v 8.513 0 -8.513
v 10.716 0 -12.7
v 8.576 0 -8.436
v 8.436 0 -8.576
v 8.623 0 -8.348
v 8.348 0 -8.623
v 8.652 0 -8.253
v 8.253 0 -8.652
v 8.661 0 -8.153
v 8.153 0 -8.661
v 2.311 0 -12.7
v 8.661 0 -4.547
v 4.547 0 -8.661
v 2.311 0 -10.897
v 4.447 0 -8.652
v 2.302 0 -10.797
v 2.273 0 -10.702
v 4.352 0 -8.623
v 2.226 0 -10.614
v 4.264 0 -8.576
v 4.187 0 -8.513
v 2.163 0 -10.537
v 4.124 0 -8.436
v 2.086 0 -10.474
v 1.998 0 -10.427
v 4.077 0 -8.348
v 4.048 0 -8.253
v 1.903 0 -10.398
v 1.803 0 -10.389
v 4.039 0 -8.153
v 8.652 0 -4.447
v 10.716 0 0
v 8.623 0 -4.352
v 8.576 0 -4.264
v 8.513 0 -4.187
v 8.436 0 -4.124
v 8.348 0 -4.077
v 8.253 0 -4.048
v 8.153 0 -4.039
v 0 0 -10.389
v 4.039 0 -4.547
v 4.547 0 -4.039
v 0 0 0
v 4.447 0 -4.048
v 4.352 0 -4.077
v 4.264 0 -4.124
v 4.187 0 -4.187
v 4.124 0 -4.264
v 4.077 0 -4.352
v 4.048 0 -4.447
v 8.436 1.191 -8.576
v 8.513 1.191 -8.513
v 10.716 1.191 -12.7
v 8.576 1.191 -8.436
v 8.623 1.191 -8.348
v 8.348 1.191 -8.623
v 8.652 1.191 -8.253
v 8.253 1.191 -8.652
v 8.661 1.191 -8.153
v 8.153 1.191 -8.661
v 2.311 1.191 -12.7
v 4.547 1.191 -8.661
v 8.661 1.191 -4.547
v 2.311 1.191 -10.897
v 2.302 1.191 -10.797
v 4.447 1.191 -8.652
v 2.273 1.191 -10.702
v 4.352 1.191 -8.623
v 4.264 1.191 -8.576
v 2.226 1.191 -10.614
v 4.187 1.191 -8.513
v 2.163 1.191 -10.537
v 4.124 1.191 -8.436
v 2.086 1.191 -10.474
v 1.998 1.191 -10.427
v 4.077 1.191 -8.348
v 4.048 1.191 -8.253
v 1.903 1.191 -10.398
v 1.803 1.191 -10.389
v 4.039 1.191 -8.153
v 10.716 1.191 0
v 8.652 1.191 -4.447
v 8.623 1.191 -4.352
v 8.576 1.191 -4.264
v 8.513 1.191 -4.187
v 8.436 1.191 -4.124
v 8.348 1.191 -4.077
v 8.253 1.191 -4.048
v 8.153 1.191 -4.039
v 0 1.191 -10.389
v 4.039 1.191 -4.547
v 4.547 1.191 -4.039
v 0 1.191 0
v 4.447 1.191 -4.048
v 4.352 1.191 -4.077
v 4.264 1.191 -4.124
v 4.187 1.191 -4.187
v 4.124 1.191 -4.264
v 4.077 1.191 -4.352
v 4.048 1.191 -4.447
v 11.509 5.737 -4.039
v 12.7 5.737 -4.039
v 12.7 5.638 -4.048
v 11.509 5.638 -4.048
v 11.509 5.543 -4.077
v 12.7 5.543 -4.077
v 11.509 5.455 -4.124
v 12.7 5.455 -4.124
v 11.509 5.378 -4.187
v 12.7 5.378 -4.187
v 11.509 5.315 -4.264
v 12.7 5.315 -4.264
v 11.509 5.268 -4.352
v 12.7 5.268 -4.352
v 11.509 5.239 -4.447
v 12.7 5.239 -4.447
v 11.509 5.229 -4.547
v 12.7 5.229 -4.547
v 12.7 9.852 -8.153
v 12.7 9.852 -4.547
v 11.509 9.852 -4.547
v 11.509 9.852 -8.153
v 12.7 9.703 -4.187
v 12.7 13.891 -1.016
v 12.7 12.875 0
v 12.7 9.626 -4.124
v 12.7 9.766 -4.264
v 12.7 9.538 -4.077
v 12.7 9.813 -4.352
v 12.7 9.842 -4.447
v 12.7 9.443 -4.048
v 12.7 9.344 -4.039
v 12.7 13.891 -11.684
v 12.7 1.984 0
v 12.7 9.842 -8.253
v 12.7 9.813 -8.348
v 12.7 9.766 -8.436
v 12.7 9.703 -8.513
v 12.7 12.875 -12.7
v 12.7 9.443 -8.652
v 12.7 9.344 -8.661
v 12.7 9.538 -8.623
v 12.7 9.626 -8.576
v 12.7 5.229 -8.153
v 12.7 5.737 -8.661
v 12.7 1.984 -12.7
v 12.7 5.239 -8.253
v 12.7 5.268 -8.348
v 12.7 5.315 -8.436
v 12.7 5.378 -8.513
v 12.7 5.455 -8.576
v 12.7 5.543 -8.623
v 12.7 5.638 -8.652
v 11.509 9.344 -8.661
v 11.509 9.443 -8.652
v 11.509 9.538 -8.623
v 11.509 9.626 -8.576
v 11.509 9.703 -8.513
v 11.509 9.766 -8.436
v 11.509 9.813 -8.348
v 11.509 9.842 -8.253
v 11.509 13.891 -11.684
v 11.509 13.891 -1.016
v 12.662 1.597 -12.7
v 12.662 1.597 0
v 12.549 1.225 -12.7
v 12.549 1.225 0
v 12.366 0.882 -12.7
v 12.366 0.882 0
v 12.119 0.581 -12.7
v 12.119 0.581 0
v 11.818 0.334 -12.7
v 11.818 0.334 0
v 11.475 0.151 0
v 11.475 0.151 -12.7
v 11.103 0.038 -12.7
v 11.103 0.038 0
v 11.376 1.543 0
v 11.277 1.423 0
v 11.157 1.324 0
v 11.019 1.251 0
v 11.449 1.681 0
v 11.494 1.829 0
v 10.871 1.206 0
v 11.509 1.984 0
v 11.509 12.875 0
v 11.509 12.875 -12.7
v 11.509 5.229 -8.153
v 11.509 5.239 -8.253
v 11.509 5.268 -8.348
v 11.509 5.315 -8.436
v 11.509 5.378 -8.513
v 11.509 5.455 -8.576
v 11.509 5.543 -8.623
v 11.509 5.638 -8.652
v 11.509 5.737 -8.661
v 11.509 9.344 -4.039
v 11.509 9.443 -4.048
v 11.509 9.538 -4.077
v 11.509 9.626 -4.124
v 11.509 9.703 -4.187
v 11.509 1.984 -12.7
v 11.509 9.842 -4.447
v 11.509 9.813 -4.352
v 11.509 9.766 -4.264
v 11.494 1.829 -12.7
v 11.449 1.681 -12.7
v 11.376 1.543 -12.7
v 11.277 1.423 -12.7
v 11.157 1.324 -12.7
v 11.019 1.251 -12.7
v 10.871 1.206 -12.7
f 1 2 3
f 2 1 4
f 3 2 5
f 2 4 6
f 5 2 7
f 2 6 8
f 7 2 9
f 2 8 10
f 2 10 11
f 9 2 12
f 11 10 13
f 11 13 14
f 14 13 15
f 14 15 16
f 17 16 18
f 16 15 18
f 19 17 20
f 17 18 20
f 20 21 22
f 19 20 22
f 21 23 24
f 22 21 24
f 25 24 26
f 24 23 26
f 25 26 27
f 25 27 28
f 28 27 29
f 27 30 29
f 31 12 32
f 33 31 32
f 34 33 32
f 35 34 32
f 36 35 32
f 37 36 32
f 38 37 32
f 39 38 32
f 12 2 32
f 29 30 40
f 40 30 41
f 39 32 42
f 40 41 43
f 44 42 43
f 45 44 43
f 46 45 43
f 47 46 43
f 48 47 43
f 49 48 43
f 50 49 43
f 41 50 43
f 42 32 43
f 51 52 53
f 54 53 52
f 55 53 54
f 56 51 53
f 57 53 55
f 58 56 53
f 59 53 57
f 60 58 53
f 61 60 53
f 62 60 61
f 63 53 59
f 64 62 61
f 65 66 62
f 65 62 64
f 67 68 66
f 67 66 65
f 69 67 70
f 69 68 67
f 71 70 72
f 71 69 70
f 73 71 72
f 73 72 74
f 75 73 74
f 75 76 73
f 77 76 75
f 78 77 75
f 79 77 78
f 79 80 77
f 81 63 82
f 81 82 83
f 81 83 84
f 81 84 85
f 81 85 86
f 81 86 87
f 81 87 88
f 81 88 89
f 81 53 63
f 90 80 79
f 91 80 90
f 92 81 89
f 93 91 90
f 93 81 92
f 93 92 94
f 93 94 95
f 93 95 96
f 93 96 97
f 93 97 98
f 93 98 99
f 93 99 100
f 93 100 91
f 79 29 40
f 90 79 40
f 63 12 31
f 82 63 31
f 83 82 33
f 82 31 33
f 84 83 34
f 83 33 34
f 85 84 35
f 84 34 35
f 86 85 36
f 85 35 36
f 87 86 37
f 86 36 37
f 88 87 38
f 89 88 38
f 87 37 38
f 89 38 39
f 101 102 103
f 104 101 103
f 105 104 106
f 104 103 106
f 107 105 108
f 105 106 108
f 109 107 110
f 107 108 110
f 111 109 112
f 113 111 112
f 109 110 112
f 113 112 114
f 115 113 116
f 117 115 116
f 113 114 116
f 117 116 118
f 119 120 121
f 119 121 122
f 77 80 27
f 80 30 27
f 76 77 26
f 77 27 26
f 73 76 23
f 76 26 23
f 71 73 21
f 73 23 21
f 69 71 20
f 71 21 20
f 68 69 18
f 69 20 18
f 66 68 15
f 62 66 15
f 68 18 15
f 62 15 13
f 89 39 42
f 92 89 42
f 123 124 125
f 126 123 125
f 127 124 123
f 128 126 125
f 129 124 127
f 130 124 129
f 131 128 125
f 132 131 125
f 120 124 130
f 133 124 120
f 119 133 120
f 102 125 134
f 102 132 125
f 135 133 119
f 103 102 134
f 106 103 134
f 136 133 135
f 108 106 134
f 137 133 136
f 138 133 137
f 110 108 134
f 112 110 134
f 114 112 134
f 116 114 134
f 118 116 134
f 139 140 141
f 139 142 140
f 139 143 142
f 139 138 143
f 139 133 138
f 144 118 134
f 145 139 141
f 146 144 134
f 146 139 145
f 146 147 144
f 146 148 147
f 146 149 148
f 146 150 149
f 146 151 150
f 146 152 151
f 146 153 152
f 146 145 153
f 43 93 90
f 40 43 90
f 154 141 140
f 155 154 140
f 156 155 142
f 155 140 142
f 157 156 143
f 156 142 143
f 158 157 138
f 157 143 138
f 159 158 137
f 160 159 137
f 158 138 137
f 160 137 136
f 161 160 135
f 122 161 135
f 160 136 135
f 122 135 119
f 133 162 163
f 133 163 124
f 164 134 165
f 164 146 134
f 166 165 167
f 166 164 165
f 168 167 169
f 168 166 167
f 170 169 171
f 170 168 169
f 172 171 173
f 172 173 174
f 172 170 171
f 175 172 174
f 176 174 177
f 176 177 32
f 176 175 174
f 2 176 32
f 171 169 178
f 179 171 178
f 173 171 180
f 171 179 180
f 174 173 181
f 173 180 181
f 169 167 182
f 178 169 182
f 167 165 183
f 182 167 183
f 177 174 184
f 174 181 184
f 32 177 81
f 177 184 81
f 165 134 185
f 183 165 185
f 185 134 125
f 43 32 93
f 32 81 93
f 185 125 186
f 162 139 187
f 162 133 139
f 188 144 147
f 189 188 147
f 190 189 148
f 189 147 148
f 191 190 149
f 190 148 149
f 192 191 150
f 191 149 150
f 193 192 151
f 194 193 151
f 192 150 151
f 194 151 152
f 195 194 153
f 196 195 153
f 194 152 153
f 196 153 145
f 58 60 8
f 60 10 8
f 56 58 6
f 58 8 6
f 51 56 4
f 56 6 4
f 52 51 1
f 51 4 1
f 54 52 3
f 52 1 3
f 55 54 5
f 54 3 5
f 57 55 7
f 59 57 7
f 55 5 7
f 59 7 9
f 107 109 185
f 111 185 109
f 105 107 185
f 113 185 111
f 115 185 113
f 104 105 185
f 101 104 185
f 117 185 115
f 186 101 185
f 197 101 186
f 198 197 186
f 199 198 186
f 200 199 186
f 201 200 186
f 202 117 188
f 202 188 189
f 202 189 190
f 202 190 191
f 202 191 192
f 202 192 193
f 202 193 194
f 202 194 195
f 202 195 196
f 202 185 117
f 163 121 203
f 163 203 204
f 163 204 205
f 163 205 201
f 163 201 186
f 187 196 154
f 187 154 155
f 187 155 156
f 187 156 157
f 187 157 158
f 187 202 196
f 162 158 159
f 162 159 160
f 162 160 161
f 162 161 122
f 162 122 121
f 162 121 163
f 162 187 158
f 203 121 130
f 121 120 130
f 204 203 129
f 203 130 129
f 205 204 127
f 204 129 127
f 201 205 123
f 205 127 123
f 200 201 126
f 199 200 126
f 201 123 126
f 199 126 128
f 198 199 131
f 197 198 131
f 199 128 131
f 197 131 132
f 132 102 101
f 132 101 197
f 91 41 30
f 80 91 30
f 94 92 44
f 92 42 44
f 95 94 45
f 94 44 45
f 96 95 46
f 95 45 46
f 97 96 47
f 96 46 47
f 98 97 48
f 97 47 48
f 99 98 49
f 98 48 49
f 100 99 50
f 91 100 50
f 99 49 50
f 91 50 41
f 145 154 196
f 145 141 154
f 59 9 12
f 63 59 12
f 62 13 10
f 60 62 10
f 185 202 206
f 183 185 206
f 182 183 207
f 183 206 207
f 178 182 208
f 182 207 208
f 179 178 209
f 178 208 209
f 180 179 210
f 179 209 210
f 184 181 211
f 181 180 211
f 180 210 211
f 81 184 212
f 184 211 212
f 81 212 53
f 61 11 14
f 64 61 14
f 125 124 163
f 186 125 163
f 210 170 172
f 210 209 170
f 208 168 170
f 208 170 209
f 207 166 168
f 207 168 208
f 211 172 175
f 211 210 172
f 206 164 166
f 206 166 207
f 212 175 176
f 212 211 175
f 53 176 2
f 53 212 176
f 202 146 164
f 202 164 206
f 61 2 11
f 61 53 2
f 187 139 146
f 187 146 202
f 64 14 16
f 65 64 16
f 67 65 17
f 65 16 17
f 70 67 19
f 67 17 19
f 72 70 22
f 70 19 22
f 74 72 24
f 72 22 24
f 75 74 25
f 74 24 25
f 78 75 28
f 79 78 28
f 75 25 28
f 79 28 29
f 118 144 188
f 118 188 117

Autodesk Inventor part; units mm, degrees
ref_plane "YZ Plane" through (0, 0, 0) normal (1, 0, 0) x (0, 1, 0)
ref_plane "XZ Plane" through (0, 0, 0) normal (0, 1, 0) x (-1, 0, 0)
sketch "Sketch1" plane through (0, 0, 0) normal (0, 1, 0) x (-1, 0, 0)
  line L0 (-12.7, 0) -> (12.7, 0)
  line L1 (12.7, 0) -> (12.7, -12.7)
  line L2 (12.7, -12.7) -> (-12.7, -12.7)
  line L3 (-12.7, -12.7) -> (-12.7, 0)
  line L4 (12.7, 0) -> (-12.7, -12.7) construction
  point P0 (0, 0)
  point P1 (0, 0)
  dimension "d0" = 25.4
  dimension "d1" = 12.7
extrude "Plate1" add sketch "Sketch1" along normal blind 1.1906
sketch "Sketch2" plane through (11.5094, 0, -12.7) normal (1, 0, 0) x (0, 1, 0)
  line L0 (0, 12.7) -> (0, 0)
  line L1 (0, 0) -> (13.8906, 0)
  line L2 (13.8906, 0) -> (13.8906, 12.7)
  line L3 (13.8906, 12.7) -> (0, 12.7)
edge flange "Flanges" height 12.7 angle 90 thickness 1.1906 bend radius 0.7937 thickness toward (1, 0, 0) relief tear relief width 1.1906 relief depth 0.5953 corner gap 1.1906 corner form 0 edges at (12.7, 1.1906, -6.35) (-12.7, 1.1906, -6.35) wall of the first edge with corners at (11.5094, 0, 0) (11.5094, 0, -12.7) (11.5094, 13.8906, -12.7) (11.5094, 13.8906, 0)
bend "Bend1"
corner "Corner1"
sketch "Sketch3" plane through (12.7, 1.9844, -12.7) normal (1, 0, 0) x (0, 0, -1)
  line L0 (-8.1534, 7.8676) -> (-4.5466, 7.8676)
  line L1 (-4.0386, 7.3596) -> (-4.0386, 3.7528)
  line L2 (-4.5466, 3.2448) -> (-8.1534, 3.2448)
  line L3 (-8.6614, 3.7528) -> (-8.6614, 7.3596)
  arc A0 (-8.1534, 7.8676) -> (-8.6614, 7.3596) centre (-8.1534, 7.3596) ccw
  arc A1 (-4.0386, 7.3596) -> (-4.5466, 7.8676) centre (-4.5466, 7.3596) ccw
  arc A2 (-4.5466, 3.2448) -> (-4.0386, 3.7528) centre (-4.5466, 3.7528) ccw
  arc A3 (-8.6614, 3.7528) -> (-8.1534, 3.2448) centre (-8.1534, 3.7528) ccw
  line L4 (-12.7, 0) -> (-12.7, 11.9063) construction
  line L5 (-12.7, 11.9063) -> (0, 11.9063) construction
  line L6 (-8.1534, 7.3596) -> (-4.5466, 3.7528) construction
  point P0 (-12.7, -1.9844)
  point P1 (-4.0386, 3.2448)
  point P2 (-8.6614, 3.2448)
  point P3 (-6.35, 5.5562)
  dimension "d16" = 4.6228
  dimension "d17" = 0.508
  dimension "d20" = 6.35
  dimension "d21" = 6.35
extrude "Flange Stamp" cut sketch "Sketch3" against normal blind 1.1906
sketch "Sketch7" plane through (12.7, 1.9844, 0) normal (1, 0, 0) x (0, 0, -1)
  arc A0 (4.5466, 7.8676) -> (4.0386, 7.3596) centre (4.5466, 7.3596) ccw construction
  arc A1 (8.1534, 3.2448) -> (8.6614, 3.7528) centre (8.1534, 3.7528) ccw construction
  circle A2 centre (6.35, 5.5563) radius 2.1844
  line L0 (4.5466, 7.3596) -> (8.1534, 3.7528) construction
  point P0 (0, -1.9844)
  dimension "d46" = 4.3688
surface extrude "Flange Circle" sketch "Sketch7" against normal up to surface (1.1906 mm away) shown yes curves A2
ref_plane "Flange Pattern Plane" through (12.7, 7.5406, -4.5466) normal (0, 1, 0) x (1, 0, 0)
sketch "Flange Pattern Sketch" plane through (12.7, 7.5406, -4.5466) normal (0, 1, 0) x (1, 0, 0)
  line L0 (0, 3.6068) -> (0, 0) construction
  line L1 (-30.5622, -4.5466) -> (5.5732, -4.5466) construction
  line L2 (0, 0) -> (-1.1906, 0) construction
  point P0 (-12.7, -4.5466)
  point P1 (0, 1.8034)
  point P2 (0, 14.5034)
  dimension "d43" = 25.4
  dimension "d40" = 12.7
feature "Flange Pattern" [suppressed]
sketch "Sketch8" plane through (0, 0, 0) normal (0, -1, 0) x (1, 0, 0)
  line L0 (10.7156, 0) -> (-10.7156, 0) construction
  line L1 (8.1534, -4.0386) -> (4.5466, -4.0386)
  line L2 (4.0386, -4.5466) -> (4.0386, -8.1534)
  line L3 (4.5466, -8.6614) -> (8.1534, -8.6614)
  line L4 (8.6614, -8.1534) -> (8.6614, -4.5466)
  arc A0 (8.6614, -4.5466) -> (8.1534, -4.0386) centre (8.1534, -4.5466) ccw
  arc A1 (8.1534, -8.6614) -> (8.6614, -8.1534) centre (8.1534, -8.1534) ccw
  arc A2 (4.0386, -8.1534) -> (4.5466, -8.6614) centre (4.5466, -8.1534) ccw
  arc A3 (4.5466, -4.0386) -> (4.0386, -4.5466) centre (4.5466, -4.5466) ccw
  line L5 (8.1534, -4.5466) -> (4.5466, -8.1534) construction
  line L6 (12.7, 0) -> (12.7, -12.7) construction
  point P0 (0, 0)
  point P1 (4.0386, -8.6614)
  point P2 (8.6614, -8.6614)
  point P3 (6.35, -6.35)
  dimension "d49" = 4.6228
  dimension "d50" = 0.508
  dimension "d51" = 6.35
  dimension "d52" = 6.35
extrude "Body Stamp" cut sketch "Sketch8" against normal blind 1.1906
sketch "Sketch9" plane through (0, 0, 0) normal (0, -1, 0) x (1, 0, 0)
  arc A0 (8.6614, -4.5466) -> (8.1534, -4.0386) centre (8.1534, -4.5466) ccw construction
  arc A1 (4.0386, -8.1534) -> (4.5466, -8.6614) centre (4.5466, -8.1534) ccw construction
  line L0 (8.1534, -4.5466) -> (4.5466, -8.1534) construction
  circle A2 centre (6.35, -6.35) radius 2.1844
  point P0 (0, 0)
  dimension "d55" = 4.3688
surface extrude "Body Circle" sketch "Sketch9" against normal up to surface (1.1906 mm away) shown yes curves A2
sketch "Body Pattern Sketch" plane through (0, 0, 0) normal (0, -1, 0) x (1, 0, 0)
  line L0 (10.7156, 0) -> (-10.7156, 0) construction
  line L1 (12.7, 0) -> (12.7, -12.7) construction
  point P0 (0, 0)
  point P1 (6.35, -6.35)
  point P2 (6.35, -19.05)
  dimension "d62" = 12.7
  dimension "d65" = 12.7
  dimension "d58" = 6.35
  dimension "d99" = 6.35
feature "Body Pattern" [suppressed]
sketch "Sketch15" plane through (0, 0, 0) normal (0, -1, 0) x (1, 0, 0)
  line L0 (10.7156, 0) -> (-10.7156, 0) construction
  line L1 (1.8034, -10.3886) -> (-1.8034, -10.3886)
  line L2 (-2.3114, -10.8966) -> (-2.3114, -14.5034)
  line L3 (-1.8034, -15.0114) -> (1.8034, -15.0114)
  line L4 (2.3114, -14.5034) -> (2.3114, -10.8966)
  arc A0 (2.3114, -10.8966) -> (1.8034, -10.3886) centre (1.8034, -10.8966) ccw
  arc A1 (1.8034, -15.0114) -> (2.3114, -14.5034) centre (1.8034, -14.5034) ccw
  arc A2 (-1.8034, -10.3886) -> (-2.3114, -10.8966) centre (-1.8034, -10.8966) ccw
  arc A3 (-2.3114, -14.5034) -> (-1.8034, -15.0114) centre (-1.8034, -14.5034) ccw
  line L5 (1.8034, -10.8966) -> (-1.8034, -14.5034) construction
  line L6 (12.7, 0) -> (12.7, -12.7) construction
  point P0 (0, 0)
  point P1 (-2.3114, -15.0114)
  point P2 (2.3114, -15.0114)
  point P3 (0, -12.7)
  dimension "d106" = 4.6228
  dimension "d107" = 0.508
  dimension "d108" = 12.7
  dimension "d109" = 12.7
extrude "Center Stamp" cut sketch "Sketch15" against normal blind 1.1906
sketch "Sketch16" plane through (0, 0, 0) normal (0, -1, 0) x (1, 0, 0)
  circle A0 centre (0, -12.7) radius 2.1844
  line L0 (10.7156, 0) -> (-10.7156, 0) construction
  line L1 (12.7, 0) -> (12.7, -12.7) construction
  point P0 (0, 0)
  dimension "d112" = 4.3688
  dimension "d118" = 12.7
  dimension "d119" = 12.7
extrude_surface "Center Circle" [suppressed]
pattern_linear "Center Pattern" [suppressed]
sketch "Arc Length" plane through (11.5094, 1.9844, 0) normal (0, 0, 1) x (1, 0, 0)
  line L0 (0, 0) -> (1.1906, 0) construction
  arc A0 (-0.7937, -0.7938) -> (0, 0) centre (-0.7938, 0) ccw construction
  line L1 (-0.7937, -1.9844) -> (-0.7937, -0.7938) construction
  arc A1 (-0.7937, -1.9844) -> (1.1906, 0) centre (-0.7937, 0) ccw construction
  point P0 (-11.5094, -1.9844)
  dimension "d85" = 3.117
  dimension "d92" = 1.2468
sketch "Sketch13" plane through (12.7, 13.8906, 0) normal (1, 0, 0) x (0, 0, -1)
  line L0 (0, 0) -> (12.7, 0) construction
  line L1 (62.4078, 0) -> (63.4238, -1.016)
  line L2 (63.4238, -1.016) -> (64.4398, 0)
  line L3 (62.4078, 0) -> (64.4398, 0)
  line L4 (12.7, -11.9063) -> (0, -11.9063) construction
  line L5 (63.4238, -10.8903) -> (61.3168, -12.9972)
  line L6 (61.3168, -12.9972) -> (63.4238, -15.1042)
  line L7 (63.4238, -15.1042) -> (65.5308, -12.9972)
  line L8 (65.5308, -12.9972) -> (63.4238, -10.8903)
  line L9 (63.4238, -10.8903) -> (63.4238, -15.1042) construction
  line L10 (63.4238, -1.016) -> (63.4238, -10.8903) construction
  line L11 (0, -11.9063) -> (12.7, -11.9063) construction
  point P0 (0, -13.8906)
  dimension "d86" = 4.2139
  dimension "d88" = 1.016
  dimension "d91" = 1.016
  dimension "d102" = 63.4238
feature "Notch" [suppressed]
mirror "Notch Mirror" [suppressed]
pattern_linear "Notch Pattern" [suppressed]
chamfer "End Chamfer" distance 1.016 angle 45 4 edges at (-12.1047, 13.8906, -12.7) (12.1047, 13.8906, -12.7) (-12.1047, 13.8906, 0) (12.1047, 13.8906, 0)
sketch "Sketch14" plane through (-12.7, 1.9844, 431.8) normal (1, 0, 0) x (0, 0, -1)
  line L0 (431.8, 11.9063) -> (444.5, 11.9063) construction
  line L1 (431.8, 0) -> (431.8, 11.9063) construction
  line L2 (431.8, -1.9844) -> (444.5, -1.9844) construction
  line L3 (431.8, 11.9063) -> (444.5, 11.9063)
  line L4 (444.5, 11.9063) -> (444.5, -1.9844)
  line L5 (444.5, -1.9844) -> (431.8, -1.9844)
  line L6 (431.8, -1.9844) -> (431.8, 11.9063)
  point P0 (62.4078, 11.9062)
  point P1 (432.816, 11.9063)
  point P2 (431.8, 10.8903)
  point P3 (382.0521, -1.9844)
  point P4 (443.484, 11.9063)
  point P5 (254.9398, 11.9062)
  point P6 (316.4078, 11.9062)
extrude "Half Cut" cut sketch "Sketch14" along normal blind 12.7
equation "\"d1\" = 12.7 * Length"
equation "\"d18\" = Thickness"
equation "\"d53\" = Thickness"
equation "\"d89\" = Thickness"
equation "\"d2\" = Thickness"
equation "\"d3\" = BendReliefWidth"
equation "\"d4\" = BendReliefDepth"
equation "\"d5\" = MinimumRemnant"
equation "\"d6\" = TransitionRadius"
equation "\"d10\" = CornerReliefSize"
equation "\"d11\" = GapSize"
equation "\"d12\" = JacobiRadiusSize"
equation "\"BendRadius\" = Thickness"
equation "\"BendReliefWidth\" = Thickness"
equation "\"BendReliefDepth\" = 0.5 * Thickness"
equation "\"CornerReliefSize\" = 4 * Thickness"
equation "\"MinimumRemnant\" = 2 * Thickness"
equation "\"TransitionRadius\" = BendRadius"
equation "\"JacobiRadiusSize\" = BendRadius"
equation "\"GapSize\" = Thickness"
equation "\"Length\" = 1"
equation "\"Thickness\" = 1.190625"
properties part number "Alu C 1x2x1x35"
